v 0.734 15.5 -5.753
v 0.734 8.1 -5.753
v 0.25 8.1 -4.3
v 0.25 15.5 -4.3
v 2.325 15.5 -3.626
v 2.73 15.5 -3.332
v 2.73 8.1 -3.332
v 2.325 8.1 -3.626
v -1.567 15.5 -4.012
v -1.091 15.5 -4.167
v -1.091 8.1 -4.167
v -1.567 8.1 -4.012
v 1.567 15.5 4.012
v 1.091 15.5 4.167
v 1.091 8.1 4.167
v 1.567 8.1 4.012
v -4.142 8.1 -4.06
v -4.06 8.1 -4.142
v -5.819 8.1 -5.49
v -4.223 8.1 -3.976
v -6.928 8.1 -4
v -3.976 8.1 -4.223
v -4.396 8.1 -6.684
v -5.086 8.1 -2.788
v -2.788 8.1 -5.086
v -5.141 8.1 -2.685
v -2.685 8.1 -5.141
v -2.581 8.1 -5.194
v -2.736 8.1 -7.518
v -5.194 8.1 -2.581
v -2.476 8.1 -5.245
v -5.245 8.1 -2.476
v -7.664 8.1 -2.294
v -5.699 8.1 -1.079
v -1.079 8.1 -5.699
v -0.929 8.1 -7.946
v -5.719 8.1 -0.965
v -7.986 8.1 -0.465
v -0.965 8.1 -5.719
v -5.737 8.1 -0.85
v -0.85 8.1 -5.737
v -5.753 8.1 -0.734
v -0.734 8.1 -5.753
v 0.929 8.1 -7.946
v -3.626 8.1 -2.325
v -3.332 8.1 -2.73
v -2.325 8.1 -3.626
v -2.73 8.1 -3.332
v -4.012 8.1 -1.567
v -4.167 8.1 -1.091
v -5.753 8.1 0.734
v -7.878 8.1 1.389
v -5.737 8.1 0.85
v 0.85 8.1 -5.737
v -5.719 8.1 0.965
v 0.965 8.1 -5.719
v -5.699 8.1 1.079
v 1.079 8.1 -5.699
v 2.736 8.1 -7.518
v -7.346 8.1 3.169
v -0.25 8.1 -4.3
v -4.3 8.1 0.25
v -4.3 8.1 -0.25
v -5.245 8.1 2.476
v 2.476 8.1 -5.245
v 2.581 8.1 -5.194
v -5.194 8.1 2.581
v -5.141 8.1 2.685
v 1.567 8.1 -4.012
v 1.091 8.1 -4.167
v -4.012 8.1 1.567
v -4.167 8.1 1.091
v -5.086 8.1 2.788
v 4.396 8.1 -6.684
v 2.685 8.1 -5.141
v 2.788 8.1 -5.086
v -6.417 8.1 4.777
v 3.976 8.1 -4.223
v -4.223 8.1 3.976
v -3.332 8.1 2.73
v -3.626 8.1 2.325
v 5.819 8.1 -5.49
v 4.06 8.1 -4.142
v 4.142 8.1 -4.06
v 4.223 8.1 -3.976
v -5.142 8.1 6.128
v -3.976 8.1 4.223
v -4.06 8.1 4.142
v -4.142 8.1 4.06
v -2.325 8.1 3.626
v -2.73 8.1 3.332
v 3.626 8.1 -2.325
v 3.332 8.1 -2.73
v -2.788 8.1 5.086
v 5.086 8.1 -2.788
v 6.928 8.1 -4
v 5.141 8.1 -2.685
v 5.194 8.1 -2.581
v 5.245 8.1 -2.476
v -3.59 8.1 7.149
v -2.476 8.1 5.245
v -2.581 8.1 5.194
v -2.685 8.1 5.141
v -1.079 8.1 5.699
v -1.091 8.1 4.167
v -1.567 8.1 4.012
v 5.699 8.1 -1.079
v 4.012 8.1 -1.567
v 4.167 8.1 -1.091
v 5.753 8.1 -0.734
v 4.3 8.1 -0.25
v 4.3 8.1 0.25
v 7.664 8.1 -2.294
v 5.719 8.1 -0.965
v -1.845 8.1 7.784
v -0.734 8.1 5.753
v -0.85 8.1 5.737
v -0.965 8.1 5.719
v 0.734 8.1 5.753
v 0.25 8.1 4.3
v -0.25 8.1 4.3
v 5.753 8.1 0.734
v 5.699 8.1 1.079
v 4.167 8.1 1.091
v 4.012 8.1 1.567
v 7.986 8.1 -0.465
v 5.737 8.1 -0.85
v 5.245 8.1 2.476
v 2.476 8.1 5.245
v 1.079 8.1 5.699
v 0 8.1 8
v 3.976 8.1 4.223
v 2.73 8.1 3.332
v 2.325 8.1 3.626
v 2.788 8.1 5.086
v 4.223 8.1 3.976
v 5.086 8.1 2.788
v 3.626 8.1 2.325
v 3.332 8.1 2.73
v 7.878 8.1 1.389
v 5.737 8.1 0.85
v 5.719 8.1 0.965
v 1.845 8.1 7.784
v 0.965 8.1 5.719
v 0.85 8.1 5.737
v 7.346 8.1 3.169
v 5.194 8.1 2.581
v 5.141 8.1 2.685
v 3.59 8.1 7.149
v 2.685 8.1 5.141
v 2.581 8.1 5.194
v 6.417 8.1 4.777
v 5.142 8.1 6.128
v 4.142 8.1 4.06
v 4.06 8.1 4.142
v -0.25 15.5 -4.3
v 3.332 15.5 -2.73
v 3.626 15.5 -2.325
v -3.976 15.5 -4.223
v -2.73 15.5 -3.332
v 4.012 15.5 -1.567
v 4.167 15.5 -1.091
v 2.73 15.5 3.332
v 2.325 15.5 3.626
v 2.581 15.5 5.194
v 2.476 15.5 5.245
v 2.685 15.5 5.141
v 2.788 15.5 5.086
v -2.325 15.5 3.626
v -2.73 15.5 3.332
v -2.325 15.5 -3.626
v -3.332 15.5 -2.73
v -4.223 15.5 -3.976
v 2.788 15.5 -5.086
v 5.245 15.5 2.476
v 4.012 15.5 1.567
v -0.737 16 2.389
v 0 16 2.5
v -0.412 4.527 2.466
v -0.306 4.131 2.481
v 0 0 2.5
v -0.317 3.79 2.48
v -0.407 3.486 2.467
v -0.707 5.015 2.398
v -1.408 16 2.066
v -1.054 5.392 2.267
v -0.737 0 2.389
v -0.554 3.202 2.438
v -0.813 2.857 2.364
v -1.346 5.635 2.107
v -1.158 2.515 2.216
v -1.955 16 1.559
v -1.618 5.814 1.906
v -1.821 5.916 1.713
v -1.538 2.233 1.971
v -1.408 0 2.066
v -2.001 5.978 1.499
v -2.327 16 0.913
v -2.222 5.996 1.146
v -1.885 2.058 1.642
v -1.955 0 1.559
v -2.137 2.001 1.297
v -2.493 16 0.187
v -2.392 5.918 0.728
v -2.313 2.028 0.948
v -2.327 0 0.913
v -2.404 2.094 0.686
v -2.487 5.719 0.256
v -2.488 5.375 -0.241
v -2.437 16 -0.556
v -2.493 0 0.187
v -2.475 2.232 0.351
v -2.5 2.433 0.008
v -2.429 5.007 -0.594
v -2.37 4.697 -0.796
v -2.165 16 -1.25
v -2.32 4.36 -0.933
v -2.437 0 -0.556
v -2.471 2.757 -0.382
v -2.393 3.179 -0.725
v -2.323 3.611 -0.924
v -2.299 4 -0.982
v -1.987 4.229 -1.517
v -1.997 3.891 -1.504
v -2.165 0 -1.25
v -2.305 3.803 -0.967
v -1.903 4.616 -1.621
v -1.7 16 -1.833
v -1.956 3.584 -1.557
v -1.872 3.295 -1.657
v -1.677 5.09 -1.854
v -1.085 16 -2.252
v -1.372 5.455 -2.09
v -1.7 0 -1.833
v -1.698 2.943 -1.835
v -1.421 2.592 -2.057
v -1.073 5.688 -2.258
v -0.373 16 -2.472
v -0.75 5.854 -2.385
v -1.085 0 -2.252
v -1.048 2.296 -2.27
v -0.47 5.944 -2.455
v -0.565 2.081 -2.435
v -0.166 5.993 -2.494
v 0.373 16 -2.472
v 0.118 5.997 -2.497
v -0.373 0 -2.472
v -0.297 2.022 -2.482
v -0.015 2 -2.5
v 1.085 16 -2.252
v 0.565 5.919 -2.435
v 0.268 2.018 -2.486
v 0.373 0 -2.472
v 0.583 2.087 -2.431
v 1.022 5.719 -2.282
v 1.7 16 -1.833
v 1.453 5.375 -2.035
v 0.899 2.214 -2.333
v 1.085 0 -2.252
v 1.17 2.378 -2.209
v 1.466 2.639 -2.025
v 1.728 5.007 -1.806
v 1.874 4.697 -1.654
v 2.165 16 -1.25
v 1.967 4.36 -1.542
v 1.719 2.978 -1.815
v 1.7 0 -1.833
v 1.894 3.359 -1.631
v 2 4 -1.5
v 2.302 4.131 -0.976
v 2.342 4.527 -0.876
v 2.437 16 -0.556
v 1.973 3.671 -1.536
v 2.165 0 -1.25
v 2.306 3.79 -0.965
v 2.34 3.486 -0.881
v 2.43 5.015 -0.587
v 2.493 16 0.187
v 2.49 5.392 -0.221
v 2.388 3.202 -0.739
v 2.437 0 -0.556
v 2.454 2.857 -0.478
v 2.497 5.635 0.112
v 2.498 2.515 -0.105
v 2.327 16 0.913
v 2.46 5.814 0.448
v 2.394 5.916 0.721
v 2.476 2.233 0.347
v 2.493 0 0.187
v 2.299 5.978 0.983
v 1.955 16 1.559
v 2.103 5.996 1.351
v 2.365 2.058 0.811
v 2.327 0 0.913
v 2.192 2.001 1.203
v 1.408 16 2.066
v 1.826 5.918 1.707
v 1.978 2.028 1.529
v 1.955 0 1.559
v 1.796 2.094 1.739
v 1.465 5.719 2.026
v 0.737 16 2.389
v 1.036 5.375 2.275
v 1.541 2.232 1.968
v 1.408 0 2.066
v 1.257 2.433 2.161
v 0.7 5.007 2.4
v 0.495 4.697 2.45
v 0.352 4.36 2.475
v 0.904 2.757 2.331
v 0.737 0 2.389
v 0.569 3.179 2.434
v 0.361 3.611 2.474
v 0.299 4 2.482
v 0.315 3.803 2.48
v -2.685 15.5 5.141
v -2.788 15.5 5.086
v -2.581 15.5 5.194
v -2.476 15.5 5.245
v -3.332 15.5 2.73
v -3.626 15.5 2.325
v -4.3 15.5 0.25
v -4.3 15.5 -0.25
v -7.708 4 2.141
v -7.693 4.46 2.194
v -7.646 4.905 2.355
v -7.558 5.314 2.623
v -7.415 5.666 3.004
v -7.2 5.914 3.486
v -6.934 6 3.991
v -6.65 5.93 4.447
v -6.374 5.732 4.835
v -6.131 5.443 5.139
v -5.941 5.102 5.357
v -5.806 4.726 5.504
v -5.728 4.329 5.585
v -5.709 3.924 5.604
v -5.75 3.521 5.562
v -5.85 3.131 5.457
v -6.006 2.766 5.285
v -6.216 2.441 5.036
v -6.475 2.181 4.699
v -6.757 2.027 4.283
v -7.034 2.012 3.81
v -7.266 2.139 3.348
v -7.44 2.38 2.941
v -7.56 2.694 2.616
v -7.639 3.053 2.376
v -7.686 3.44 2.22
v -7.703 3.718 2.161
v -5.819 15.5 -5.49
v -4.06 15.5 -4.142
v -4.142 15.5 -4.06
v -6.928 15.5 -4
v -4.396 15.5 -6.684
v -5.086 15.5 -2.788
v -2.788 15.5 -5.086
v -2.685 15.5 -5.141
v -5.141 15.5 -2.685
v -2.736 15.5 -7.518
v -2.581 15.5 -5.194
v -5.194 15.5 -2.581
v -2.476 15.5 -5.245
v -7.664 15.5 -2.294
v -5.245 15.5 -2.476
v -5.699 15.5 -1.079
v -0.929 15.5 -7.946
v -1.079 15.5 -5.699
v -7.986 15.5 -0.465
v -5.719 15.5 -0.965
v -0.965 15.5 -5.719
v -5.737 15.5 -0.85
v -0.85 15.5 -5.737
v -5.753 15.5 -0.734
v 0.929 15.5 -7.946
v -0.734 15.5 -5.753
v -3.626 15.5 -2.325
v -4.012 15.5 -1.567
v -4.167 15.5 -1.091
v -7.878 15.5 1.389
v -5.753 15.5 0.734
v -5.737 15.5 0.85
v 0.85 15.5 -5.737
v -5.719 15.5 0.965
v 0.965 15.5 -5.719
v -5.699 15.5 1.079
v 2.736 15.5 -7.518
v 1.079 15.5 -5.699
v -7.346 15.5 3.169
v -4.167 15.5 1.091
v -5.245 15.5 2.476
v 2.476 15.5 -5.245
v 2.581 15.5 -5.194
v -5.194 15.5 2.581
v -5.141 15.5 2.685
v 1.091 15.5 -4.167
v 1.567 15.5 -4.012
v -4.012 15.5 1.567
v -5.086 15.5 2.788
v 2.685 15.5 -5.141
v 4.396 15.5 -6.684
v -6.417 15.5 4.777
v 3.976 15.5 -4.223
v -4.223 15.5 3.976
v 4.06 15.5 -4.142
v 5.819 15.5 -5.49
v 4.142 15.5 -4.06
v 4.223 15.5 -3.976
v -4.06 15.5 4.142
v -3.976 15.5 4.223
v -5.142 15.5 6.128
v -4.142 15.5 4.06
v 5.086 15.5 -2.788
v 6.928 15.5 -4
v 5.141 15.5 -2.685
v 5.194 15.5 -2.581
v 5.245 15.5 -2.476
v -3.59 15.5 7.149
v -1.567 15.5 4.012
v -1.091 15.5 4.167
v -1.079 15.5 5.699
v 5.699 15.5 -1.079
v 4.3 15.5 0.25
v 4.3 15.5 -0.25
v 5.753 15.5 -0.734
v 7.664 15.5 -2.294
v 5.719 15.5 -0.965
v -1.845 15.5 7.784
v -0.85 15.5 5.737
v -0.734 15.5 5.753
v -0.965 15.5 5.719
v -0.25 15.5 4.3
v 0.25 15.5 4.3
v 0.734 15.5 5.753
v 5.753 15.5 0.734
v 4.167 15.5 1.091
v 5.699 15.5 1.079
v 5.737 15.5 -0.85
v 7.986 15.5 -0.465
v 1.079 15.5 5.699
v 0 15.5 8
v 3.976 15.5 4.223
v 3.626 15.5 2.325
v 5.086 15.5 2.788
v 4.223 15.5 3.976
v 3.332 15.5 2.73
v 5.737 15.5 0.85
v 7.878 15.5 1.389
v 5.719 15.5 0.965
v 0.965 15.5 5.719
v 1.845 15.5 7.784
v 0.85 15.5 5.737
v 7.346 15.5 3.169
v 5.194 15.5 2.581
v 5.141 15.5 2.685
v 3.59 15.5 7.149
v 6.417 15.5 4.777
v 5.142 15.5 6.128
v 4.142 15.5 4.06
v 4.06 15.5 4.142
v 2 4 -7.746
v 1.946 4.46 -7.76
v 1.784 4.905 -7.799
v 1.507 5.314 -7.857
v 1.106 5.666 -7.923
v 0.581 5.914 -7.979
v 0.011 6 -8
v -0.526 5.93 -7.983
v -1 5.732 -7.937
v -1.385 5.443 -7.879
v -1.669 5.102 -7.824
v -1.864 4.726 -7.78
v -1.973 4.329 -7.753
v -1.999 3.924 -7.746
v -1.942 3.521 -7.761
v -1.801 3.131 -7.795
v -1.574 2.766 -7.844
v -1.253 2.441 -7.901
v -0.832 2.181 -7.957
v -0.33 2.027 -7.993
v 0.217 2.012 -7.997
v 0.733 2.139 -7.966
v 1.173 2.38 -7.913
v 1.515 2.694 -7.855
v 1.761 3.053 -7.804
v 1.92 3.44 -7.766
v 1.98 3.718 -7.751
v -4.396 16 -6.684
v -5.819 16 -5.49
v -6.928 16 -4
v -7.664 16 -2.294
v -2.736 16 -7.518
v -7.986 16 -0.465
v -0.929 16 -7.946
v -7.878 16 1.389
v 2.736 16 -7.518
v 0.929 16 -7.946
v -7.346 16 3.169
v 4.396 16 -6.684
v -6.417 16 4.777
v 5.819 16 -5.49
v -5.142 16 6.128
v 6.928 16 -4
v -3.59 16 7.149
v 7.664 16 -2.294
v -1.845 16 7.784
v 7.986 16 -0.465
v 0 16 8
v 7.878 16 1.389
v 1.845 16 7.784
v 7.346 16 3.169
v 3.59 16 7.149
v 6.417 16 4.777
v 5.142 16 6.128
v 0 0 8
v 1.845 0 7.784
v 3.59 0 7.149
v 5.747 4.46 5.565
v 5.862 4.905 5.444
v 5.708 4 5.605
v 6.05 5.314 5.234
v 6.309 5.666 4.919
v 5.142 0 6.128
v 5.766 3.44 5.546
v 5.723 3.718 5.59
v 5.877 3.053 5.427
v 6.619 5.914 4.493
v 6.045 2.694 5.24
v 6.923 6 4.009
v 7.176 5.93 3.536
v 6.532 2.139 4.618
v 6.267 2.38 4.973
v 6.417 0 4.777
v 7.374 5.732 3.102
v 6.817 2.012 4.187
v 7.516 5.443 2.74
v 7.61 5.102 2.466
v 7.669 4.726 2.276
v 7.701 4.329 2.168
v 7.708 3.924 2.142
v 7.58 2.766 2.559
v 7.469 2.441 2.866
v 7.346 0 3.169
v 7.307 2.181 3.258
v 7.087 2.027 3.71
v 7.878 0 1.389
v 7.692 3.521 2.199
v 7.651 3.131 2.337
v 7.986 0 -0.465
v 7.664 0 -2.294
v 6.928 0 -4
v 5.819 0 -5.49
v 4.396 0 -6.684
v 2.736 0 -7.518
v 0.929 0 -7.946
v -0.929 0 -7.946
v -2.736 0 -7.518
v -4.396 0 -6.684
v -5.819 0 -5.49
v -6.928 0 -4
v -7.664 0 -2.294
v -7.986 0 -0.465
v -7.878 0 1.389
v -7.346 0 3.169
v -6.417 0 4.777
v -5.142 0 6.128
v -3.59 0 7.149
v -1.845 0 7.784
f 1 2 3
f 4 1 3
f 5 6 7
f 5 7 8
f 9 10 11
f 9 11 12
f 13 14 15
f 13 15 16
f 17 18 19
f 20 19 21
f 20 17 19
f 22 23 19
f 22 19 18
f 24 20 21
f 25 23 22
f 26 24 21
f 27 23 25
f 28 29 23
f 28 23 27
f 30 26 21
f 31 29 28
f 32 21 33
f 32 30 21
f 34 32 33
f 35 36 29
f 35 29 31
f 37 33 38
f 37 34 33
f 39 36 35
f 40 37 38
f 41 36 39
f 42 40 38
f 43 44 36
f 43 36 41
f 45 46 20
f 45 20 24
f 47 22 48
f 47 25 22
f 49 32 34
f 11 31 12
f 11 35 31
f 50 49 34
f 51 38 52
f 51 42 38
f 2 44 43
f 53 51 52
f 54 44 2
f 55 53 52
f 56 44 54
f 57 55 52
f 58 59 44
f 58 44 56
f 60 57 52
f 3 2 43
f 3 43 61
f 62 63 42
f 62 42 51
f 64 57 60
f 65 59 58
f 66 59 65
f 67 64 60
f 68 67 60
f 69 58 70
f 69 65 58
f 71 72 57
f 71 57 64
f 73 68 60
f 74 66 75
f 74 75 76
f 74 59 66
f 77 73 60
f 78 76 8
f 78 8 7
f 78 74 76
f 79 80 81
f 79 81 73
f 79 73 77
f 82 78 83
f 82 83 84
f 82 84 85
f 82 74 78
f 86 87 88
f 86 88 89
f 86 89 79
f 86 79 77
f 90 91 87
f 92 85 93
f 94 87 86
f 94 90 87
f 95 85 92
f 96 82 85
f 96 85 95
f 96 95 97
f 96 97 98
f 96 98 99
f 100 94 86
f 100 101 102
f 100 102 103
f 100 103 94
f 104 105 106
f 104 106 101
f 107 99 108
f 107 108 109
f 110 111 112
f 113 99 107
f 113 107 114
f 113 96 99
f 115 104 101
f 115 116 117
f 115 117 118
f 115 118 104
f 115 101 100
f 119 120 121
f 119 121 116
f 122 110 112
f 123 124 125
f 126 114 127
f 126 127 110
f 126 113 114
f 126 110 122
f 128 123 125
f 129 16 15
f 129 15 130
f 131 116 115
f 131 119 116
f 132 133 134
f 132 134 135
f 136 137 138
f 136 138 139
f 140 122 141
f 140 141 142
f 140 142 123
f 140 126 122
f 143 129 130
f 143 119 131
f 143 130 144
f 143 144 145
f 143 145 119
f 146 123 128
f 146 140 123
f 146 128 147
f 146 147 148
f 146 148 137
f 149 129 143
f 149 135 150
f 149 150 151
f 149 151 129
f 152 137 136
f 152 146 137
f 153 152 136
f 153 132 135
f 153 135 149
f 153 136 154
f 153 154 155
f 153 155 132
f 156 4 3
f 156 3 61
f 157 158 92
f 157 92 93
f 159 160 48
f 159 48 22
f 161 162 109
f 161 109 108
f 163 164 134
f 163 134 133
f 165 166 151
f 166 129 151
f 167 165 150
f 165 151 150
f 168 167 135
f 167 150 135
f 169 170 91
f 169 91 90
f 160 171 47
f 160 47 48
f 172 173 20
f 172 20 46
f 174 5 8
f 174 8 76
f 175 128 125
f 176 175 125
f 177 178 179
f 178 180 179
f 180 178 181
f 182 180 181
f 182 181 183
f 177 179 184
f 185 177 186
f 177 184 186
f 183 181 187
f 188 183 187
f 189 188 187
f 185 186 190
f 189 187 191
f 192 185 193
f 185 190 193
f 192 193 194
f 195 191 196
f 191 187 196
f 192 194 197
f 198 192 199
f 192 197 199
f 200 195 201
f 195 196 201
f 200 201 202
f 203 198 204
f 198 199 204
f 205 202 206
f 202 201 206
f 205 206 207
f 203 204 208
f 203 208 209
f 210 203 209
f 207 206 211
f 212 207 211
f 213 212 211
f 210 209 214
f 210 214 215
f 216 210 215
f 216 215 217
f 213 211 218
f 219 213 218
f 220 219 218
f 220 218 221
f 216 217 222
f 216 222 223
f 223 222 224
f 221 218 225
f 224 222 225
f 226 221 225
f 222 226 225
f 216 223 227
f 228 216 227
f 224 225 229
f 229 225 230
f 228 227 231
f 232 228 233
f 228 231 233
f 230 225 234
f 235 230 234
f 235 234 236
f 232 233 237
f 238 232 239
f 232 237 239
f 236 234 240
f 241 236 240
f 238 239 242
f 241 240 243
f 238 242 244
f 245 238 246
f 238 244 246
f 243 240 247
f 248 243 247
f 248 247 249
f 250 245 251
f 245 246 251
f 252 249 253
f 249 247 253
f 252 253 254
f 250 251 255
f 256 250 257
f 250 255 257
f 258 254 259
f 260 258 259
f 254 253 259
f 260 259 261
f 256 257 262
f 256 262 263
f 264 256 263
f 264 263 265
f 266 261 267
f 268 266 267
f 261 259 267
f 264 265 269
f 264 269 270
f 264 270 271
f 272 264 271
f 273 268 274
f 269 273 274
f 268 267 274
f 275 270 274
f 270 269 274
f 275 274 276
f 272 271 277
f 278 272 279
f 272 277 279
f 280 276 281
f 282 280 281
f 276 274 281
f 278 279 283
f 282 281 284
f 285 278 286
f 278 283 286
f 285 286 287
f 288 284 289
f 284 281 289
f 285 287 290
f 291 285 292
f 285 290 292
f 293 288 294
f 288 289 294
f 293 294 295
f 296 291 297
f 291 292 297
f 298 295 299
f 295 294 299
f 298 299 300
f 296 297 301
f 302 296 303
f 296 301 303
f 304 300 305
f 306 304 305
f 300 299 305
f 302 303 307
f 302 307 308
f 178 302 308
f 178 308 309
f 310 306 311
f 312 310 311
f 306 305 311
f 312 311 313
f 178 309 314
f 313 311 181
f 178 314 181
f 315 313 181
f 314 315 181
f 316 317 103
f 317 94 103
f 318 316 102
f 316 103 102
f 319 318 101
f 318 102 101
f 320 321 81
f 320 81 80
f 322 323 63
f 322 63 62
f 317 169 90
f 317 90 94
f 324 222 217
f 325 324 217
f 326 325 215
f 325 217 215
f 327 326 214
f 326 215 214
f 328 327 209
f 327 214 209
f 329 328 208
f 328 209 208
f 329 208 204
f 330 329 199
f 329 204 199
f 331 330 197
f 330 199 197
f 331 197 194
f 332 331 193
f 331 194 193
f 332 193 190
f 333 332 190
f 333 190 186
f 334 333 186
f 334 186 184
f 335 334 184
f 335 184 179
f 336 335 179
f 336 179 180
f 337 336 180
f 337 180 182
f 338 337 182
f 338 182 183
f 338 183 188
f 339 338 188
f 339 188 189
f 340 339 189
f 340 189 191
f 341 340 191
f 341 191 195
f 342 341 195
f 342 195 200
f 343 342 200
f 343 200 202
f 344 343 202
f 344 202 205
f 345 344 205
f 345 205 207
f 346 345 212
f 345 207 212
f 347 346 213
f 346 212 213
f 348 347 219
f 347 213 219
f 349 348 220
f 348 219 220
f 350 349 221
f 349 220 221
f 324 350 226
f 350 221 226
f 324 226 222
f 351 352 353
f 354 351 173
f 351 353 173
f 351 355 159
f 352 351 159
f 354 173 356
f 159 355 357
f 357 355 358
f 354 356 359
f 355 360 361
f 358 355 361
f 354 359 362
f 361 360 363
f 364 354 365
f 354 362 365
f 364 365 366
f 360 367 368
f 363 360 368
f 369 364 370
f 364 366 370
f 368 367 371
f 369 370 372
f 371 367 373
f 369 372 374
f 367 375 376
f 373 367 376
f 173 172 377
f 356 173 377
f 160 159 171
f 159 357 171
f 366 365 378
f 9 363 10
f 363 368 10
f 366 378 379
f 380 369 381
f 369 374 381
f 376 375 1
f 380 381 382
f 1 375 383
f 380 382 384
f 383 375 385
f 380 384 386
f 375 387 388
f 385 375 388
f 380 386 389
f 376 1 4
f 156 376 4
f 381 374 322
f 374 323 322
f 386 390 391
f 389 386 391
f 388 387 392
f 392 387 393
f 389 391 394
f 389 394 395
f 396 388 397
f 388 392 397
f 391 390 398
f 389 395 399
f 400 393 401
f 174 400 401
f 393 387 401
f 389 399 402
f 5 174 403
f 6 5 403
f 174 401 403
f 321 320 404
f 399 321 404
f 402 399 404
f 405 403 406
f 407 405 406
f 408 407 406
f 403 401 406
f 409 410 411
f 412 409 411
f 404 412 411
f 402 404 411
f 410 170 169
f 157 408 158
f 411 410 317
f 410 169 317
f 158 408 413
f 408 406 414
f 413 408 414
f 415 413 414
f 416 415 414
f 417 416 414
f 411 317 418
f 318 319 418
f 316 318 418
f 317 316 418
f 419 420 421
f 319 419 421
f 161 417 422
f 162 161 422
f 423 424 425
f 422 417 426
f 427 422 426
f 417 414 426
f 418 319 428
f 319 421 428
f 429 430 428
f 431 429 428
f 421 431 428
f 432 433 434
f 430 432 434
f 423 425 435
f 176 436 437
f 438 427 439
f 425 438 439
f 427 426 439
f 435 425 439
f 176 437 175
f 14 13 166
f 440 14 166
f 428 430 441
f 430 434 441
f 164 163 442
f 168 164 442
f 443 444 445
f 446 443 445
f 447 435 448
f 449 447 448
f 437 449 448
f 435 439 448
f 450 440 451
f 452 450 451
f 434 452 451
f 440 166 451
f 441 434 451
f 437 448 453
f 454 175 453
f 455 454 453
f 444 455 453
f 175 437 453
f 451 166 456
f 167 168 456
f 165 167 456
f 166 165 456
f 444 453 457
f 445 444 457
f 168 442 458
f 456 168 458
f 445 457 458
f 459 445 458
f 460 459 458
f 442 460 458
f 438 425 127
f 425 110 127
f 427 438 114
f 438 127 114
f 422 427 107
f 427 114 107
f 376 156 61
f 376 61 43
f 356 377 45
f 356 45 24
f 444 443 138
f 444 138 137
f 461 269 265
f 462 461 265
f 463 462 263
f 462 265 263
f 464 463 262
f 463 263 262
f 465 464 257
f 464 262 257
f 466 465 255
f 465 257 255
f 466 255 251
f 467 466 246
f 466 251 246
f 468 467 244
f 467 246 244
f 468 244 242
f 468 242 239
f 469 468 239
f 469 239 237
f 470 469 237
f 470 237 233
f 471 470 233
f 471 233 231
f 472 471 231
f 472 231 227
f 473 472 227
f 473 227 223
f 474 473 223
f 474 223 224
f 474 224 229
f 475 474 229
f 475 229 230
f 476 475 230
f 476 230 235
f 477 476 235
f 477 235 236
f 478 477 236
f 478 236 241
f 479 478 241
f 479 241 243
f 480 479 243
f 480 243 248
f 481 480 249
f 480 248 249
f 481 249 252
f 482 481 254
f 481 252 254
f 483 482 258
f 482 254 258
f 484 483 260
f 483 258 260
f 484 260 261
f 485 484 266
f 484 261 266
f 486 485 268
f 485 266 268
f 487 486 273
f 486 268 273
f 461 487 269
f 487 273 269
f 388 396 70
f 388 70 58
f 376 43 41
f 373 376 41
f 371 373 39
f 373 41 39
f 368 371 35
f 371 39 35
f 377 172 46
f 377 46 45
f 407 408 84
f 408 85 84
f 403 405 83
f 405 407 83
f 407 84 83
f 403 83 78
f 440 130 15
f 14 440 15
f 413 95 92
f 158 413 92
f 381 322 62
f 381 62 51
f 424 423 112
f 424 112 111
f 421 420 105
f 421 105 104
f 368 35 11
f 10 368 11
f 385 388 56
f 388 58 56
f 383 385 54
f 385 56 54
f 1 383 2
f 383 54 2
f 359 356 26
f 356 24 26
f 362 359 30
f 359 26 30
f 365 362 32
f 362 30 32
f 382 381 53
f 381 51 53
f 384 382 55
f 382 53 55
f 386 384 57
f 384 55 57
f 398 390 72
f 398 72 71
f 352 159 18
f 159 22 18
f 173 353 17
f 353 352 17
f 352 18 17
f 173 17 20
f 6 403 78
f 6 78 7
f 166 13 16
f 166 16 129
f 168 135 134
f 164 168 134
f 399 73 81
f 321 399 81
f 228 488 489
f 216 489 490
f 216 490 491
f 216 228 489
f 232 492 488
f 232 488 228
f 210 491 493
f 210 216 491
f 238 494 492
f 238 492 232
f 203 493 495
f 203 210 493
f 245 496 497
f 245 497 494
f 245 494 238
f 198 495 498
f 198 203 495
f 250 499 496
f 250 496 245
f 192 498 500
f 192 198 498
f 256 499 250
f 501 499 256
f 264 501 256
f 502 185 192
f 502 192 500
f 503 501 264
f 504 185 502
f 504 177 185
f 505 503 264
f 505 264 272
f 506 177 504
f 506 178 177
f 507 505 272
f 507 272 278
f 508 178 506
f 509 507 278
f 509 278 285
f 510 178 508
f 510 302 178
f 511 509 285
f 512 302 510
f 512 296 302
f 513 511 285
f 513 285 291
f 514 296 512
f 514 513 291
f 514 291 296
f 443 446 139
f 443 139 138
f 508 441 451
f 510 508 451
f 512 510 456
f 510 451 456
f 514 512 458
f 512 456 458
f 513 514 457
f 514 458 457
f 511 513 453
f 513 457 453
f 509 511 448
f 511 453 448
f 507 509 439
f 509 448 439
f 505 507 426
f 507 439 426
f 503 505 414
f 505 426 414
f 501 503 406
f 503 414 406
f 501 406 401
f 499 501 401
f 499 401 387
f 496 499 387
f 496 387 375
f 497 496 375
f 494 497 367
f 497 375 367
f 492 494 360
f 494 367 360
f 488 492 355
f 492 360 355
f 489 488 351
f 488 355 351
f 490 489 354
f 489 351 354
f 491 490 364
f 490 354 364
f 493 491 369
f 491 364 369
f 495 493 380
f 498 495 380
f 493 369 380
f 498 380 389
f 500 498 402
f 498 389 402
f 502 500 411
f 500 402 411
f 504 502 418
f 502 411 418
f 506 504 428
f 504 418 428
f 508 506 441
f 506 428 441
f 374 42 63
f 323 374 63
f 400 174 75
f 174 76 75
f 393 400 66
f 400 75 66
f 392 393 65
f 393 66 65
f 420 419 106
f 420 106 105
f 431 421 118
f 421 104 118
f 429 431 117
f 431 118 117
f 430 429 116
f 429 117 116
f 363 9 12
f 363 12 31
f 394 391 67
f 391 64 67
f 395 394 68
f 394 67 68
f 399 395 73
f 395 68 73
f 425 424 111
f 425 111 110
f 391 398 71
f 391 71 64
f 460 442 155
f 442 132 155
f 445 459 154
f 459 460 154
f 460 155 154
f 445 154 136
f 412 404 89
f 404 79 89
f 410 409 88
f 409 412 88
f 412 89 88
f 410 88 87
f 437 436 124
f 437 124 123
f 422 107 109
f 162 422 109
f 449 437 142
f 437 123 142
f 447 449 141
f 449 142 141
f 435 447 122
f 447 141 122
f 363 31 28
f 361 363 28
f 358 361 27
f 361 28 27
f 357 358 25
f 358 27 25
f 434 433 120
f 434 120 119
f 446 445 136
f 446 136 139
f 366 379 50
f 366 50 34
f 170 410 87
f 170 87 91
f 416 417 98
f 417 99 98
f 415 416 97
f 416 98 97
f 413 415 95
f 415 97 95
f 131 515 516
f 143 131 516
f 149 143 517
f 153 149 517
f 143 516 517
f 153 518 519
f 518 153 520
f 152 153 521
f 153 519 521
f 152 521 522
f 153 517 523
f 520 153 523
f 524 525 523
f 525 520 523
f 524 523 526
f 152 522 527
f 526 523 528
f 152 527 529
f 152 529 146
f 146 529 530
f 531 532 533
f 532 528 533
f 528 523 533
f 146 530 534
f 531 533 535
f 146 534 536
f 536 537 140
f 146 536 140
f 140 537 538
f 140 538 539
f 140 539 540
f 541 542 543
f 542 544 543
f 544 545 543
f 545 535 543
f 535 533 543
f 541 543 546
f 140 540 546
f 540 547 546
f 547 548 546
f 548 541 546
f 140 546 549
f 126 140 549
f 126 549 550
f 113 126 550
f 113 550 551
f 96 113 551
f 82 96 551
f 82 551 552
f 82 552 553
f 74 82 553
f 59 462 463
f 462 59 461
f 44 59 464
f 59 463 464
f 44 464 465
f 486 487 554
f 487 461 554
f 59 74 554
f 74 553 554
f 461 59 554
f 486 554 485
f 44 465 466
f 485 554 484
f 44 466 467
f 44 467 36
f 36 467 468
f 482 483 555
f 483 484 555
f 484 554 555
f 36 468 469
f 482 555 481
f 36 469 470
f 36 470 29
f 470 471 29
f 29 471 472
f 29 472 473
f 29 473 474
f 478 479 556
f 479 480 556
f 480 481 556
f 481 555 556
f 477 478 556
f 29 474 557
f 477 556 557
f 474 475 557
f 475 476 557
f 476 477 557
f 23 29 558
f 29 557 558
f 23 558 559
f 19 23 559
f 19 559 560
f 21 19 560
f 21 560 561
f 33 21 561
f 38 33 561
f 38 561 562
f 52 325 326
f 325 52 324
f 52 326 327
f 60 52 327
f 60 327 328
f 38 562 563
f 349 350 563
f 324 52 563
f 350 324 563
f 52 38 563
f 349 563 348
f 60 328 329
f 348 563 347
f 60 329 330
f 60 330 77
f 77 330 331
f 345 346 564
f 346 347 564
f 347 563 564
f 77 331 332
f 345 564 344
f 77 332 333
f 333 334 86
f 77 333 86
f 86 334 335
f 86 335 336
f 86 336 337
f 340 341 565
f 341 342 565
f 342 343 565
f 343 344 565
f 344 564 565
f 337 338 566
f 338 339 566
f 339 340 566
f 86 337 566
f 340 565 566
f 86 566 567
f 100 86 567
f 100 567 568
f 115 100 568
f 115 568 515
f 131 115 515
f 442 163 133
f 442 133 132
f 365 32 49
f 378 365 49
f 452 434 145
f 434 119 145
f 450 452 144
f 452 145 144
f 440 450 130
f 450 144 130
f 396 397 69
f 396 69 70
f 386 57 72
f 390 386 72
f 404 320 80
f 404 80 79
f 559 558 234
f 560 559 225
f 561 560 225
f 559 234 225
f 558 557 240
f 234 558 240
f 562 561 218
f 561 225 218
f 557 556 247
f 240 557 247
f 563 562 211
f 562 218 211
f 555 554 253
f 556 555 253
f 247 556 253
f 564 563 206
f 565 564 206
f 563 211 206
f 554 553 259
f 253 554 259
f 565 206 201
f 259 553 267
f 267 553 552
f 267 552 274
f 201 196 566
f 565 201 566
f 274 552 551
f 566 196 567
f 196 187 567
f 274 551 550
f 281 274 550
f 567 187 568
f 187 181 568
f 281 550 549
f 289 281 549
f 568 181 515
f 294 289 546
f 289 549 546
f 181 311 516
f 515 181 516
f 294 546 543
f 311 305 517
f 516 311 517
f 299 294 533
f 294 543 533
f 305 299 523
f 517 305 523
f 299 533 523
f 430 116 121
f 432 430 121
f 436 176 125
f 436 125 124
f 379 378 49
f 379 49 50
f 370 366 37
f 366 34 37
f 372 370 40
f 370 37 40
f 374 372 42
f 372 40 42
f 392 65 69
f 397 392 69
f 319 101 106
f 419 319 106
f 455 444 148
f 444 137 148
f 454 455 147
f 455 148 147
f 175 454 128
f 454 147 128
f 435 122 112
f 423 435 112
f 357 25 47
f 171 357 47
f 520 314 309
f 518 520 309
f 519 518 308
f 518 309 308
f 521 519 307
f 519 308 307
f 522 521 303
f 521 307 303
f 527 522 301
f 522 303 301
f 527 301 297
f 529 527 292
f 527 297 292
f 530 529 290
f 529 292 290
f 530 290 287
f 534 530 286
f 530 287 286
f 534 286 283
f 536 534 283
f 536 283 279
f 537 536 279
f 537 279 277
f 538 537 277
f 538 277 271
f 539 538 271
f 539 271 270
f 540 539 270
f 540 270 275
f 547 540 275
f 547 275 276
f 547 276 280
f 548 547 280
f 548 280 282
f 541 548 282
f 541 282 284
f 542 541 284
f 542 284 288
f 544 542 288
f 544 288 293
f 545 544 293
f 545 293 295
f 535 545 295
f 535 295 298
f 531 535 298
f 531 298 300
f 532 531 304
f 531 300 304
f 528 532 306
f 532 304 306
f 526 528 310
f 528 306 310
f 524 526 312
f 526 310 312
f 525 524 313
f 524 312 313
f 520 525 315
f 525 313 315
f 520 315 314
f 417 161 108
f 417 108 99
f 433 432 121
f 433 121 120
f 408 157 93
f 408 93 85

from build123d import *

# Parameters (mm, degrees)
SKETCH11_R               = 8
BOSS_EXTRUDE5_DEPTH      = 15.5
SKETCH12_R               = 2.5
CUT_EXTRUDE9_DEPTH       = 20.189841062
CUT_EXTRUDE11_START      = -7.4
SKETCH14_R               = 8
SKETCH14_R_2             = 5.8
CUT_EXTRUDE11_DEPTH      = 7.4
CUT_EXTRUDE12_DEPTH      = 7.4
CIRPATTERN5_COUNT        = 20
SKETCH16_R               = 8
BOSS_EXTRUDE6_DEPTH      = 0.5
SKETCH17_R               = 2.5
CUT_EXTRUDE13_DEPTH      = 20.189841062
CUT_EXTRUDE14_REACH      = 21.596
CUT_EXTRUDE14_END_RADIUS = 8
SKETCH18_R               = 2
CIRPATTERN6_COUNT        = 3


with BuildPart() as part:
    # Sketch11 → Boss-Extrude5 (new body)
    with BuildSketch(Plane(origin=(0, 0, 0), x_dir=(1, 0, 0), z_dir=(0, 1, 0))):
        with Locations(Location((0, 0, 0), (0, 0, 270))):
            Circle(SKETCH11_R)
    extrude(amount=BOSS_EXTRUDE5_DEPTH)

    # Sketch12 → Cut-Extrude9 (cut, through all)
    with BuildSketch(Plane(origin=(0, 15.5, 0), x_dir=(1, 0, 0), z_dir=(0, 1, 0))):
        with Locations(Location((0, 0, 0), (0, 0, 270))):
            Circle(SKETCH12_R)
    extrude(amount=-CUT_EXTRUDE9_DEPTH, mode=Mode.SUBTRACT)

    # Sketch14 → Cut-Extrude11 (cut)
    with BuildSketch(Plane(origin=(0, 15.5, 0), x_dir=(1, 0, 0), z_dir=(0, 1, 0)).offset(CUT_EXTRUDE11_START)):
        with Locations(Location((0, 0, 0), (0, 0, 270))):
            Circle(SKETCH14_R)
        with Locations(Location((0, 0, 0), (0, 0, 270))):
            Circle(SKETCH14_R_2, mode=Mode.SUBTRACT)
    extrude(amount=CUT_EXTRUDE11_DEPTH, mode=Mode.SUBTRACT)

    # Sketch15 → Cut-Extrude12 (cut)
    with BuildSketch(Plane(origin=(0, 15.5, 0), x_dir=(1, 0, 0), z_dir=(0, 1, 0))):
        Polygon((-0.75, 5.8), (0.75, 5.8), (0.25, 4.3), (-0.25, 4.3), align=None)
    cut_extrude12 = extrude(amount=-CUT_EXTRUDE12_DEPTH, mode=Mode.SUBTRACT)

    # CirPattern5: Cut-Extrude12 ×20 about axis
    cirpattern5_axis = Axis((0, 0, 0), (0, 1, 0))
    for i in range(1, CIRPATTERN5_COUNT):
        add(cut_extrude12.rotate(cirpattern5_axis, i * 360 / CIRPATTERN5_COUNT), mode=Mode.SUBTRACT)

    # Sketch16 → Boss-Extrude6 (add)
    with BuildSketch(Plane(origin=(0, 15.5, 0), x_dir=(1, 0, 0), z_dir=(0, 1, 0))):
        with Locations(Location((0, 0, 0), (0, 0, 270))):
            Circle(SKETCH16_R)
    extrude(amount=BOSS_EXTRUDE6_DEPTH)

    # Sketch17 → Cut-Extrude13 (cut, through all)
    with BuildSketch(Plane.XZ.offset(-15.5)):
        with Locations(Location((0, 0, 0), (0, 0, 90))):
            Circle(SKETCH17_R)
    extrude(amount=-CUT_EXTRUDE13_DEPTH, mode=Mode.SUBTRACT)

    # Cut-Extrude14: up to this cylinder (the profile starts inside it)
    cut_extrude14_end = Plane(origin=(0, 4, 0), z_dir=(0, -1, 0)) * Cylinder(CUT_EXTRUDE14_END_RADIUS, 60.192, mode=Mode.PRIVATE)
    # Sketch18 → Cut-Extrude14 (cut, up to the surface)
    with BuildSketch(Plane.XY, mode=Mode.PRIVATE) as cut_extrude14_sk1:
        with Locations((0, 4)):
            Circle(SKETCH18_R)
    cut_extrude14_tool1 = extrude(cut_extrude14_sk1.sketch, amount=-CUT_EXTRUDE14_REACH, mode=Mode.PRIVATE) & cut_extrude14_end
    cut_extrude14 = cut_extrude14_tool1.solids().sort_by_distance((0, 4, 0))[0]
    add(cut_extrude14, mode=Mode.SUBTRACT)

    # CirPattern6: Cut-Extrude14 ×3 about axis
    cirpattern6_axis = Axis((0, 0, 0), (0, 1, 0))
    for i in range(1, CIRPATTERN6_COUNT):
        add(cut_extrude14.rotate(cirpattern6_axis, i * 360 / CIRPATTERN6_COUNT), mode=Mode.SUBTRACT)


solid = part.part
